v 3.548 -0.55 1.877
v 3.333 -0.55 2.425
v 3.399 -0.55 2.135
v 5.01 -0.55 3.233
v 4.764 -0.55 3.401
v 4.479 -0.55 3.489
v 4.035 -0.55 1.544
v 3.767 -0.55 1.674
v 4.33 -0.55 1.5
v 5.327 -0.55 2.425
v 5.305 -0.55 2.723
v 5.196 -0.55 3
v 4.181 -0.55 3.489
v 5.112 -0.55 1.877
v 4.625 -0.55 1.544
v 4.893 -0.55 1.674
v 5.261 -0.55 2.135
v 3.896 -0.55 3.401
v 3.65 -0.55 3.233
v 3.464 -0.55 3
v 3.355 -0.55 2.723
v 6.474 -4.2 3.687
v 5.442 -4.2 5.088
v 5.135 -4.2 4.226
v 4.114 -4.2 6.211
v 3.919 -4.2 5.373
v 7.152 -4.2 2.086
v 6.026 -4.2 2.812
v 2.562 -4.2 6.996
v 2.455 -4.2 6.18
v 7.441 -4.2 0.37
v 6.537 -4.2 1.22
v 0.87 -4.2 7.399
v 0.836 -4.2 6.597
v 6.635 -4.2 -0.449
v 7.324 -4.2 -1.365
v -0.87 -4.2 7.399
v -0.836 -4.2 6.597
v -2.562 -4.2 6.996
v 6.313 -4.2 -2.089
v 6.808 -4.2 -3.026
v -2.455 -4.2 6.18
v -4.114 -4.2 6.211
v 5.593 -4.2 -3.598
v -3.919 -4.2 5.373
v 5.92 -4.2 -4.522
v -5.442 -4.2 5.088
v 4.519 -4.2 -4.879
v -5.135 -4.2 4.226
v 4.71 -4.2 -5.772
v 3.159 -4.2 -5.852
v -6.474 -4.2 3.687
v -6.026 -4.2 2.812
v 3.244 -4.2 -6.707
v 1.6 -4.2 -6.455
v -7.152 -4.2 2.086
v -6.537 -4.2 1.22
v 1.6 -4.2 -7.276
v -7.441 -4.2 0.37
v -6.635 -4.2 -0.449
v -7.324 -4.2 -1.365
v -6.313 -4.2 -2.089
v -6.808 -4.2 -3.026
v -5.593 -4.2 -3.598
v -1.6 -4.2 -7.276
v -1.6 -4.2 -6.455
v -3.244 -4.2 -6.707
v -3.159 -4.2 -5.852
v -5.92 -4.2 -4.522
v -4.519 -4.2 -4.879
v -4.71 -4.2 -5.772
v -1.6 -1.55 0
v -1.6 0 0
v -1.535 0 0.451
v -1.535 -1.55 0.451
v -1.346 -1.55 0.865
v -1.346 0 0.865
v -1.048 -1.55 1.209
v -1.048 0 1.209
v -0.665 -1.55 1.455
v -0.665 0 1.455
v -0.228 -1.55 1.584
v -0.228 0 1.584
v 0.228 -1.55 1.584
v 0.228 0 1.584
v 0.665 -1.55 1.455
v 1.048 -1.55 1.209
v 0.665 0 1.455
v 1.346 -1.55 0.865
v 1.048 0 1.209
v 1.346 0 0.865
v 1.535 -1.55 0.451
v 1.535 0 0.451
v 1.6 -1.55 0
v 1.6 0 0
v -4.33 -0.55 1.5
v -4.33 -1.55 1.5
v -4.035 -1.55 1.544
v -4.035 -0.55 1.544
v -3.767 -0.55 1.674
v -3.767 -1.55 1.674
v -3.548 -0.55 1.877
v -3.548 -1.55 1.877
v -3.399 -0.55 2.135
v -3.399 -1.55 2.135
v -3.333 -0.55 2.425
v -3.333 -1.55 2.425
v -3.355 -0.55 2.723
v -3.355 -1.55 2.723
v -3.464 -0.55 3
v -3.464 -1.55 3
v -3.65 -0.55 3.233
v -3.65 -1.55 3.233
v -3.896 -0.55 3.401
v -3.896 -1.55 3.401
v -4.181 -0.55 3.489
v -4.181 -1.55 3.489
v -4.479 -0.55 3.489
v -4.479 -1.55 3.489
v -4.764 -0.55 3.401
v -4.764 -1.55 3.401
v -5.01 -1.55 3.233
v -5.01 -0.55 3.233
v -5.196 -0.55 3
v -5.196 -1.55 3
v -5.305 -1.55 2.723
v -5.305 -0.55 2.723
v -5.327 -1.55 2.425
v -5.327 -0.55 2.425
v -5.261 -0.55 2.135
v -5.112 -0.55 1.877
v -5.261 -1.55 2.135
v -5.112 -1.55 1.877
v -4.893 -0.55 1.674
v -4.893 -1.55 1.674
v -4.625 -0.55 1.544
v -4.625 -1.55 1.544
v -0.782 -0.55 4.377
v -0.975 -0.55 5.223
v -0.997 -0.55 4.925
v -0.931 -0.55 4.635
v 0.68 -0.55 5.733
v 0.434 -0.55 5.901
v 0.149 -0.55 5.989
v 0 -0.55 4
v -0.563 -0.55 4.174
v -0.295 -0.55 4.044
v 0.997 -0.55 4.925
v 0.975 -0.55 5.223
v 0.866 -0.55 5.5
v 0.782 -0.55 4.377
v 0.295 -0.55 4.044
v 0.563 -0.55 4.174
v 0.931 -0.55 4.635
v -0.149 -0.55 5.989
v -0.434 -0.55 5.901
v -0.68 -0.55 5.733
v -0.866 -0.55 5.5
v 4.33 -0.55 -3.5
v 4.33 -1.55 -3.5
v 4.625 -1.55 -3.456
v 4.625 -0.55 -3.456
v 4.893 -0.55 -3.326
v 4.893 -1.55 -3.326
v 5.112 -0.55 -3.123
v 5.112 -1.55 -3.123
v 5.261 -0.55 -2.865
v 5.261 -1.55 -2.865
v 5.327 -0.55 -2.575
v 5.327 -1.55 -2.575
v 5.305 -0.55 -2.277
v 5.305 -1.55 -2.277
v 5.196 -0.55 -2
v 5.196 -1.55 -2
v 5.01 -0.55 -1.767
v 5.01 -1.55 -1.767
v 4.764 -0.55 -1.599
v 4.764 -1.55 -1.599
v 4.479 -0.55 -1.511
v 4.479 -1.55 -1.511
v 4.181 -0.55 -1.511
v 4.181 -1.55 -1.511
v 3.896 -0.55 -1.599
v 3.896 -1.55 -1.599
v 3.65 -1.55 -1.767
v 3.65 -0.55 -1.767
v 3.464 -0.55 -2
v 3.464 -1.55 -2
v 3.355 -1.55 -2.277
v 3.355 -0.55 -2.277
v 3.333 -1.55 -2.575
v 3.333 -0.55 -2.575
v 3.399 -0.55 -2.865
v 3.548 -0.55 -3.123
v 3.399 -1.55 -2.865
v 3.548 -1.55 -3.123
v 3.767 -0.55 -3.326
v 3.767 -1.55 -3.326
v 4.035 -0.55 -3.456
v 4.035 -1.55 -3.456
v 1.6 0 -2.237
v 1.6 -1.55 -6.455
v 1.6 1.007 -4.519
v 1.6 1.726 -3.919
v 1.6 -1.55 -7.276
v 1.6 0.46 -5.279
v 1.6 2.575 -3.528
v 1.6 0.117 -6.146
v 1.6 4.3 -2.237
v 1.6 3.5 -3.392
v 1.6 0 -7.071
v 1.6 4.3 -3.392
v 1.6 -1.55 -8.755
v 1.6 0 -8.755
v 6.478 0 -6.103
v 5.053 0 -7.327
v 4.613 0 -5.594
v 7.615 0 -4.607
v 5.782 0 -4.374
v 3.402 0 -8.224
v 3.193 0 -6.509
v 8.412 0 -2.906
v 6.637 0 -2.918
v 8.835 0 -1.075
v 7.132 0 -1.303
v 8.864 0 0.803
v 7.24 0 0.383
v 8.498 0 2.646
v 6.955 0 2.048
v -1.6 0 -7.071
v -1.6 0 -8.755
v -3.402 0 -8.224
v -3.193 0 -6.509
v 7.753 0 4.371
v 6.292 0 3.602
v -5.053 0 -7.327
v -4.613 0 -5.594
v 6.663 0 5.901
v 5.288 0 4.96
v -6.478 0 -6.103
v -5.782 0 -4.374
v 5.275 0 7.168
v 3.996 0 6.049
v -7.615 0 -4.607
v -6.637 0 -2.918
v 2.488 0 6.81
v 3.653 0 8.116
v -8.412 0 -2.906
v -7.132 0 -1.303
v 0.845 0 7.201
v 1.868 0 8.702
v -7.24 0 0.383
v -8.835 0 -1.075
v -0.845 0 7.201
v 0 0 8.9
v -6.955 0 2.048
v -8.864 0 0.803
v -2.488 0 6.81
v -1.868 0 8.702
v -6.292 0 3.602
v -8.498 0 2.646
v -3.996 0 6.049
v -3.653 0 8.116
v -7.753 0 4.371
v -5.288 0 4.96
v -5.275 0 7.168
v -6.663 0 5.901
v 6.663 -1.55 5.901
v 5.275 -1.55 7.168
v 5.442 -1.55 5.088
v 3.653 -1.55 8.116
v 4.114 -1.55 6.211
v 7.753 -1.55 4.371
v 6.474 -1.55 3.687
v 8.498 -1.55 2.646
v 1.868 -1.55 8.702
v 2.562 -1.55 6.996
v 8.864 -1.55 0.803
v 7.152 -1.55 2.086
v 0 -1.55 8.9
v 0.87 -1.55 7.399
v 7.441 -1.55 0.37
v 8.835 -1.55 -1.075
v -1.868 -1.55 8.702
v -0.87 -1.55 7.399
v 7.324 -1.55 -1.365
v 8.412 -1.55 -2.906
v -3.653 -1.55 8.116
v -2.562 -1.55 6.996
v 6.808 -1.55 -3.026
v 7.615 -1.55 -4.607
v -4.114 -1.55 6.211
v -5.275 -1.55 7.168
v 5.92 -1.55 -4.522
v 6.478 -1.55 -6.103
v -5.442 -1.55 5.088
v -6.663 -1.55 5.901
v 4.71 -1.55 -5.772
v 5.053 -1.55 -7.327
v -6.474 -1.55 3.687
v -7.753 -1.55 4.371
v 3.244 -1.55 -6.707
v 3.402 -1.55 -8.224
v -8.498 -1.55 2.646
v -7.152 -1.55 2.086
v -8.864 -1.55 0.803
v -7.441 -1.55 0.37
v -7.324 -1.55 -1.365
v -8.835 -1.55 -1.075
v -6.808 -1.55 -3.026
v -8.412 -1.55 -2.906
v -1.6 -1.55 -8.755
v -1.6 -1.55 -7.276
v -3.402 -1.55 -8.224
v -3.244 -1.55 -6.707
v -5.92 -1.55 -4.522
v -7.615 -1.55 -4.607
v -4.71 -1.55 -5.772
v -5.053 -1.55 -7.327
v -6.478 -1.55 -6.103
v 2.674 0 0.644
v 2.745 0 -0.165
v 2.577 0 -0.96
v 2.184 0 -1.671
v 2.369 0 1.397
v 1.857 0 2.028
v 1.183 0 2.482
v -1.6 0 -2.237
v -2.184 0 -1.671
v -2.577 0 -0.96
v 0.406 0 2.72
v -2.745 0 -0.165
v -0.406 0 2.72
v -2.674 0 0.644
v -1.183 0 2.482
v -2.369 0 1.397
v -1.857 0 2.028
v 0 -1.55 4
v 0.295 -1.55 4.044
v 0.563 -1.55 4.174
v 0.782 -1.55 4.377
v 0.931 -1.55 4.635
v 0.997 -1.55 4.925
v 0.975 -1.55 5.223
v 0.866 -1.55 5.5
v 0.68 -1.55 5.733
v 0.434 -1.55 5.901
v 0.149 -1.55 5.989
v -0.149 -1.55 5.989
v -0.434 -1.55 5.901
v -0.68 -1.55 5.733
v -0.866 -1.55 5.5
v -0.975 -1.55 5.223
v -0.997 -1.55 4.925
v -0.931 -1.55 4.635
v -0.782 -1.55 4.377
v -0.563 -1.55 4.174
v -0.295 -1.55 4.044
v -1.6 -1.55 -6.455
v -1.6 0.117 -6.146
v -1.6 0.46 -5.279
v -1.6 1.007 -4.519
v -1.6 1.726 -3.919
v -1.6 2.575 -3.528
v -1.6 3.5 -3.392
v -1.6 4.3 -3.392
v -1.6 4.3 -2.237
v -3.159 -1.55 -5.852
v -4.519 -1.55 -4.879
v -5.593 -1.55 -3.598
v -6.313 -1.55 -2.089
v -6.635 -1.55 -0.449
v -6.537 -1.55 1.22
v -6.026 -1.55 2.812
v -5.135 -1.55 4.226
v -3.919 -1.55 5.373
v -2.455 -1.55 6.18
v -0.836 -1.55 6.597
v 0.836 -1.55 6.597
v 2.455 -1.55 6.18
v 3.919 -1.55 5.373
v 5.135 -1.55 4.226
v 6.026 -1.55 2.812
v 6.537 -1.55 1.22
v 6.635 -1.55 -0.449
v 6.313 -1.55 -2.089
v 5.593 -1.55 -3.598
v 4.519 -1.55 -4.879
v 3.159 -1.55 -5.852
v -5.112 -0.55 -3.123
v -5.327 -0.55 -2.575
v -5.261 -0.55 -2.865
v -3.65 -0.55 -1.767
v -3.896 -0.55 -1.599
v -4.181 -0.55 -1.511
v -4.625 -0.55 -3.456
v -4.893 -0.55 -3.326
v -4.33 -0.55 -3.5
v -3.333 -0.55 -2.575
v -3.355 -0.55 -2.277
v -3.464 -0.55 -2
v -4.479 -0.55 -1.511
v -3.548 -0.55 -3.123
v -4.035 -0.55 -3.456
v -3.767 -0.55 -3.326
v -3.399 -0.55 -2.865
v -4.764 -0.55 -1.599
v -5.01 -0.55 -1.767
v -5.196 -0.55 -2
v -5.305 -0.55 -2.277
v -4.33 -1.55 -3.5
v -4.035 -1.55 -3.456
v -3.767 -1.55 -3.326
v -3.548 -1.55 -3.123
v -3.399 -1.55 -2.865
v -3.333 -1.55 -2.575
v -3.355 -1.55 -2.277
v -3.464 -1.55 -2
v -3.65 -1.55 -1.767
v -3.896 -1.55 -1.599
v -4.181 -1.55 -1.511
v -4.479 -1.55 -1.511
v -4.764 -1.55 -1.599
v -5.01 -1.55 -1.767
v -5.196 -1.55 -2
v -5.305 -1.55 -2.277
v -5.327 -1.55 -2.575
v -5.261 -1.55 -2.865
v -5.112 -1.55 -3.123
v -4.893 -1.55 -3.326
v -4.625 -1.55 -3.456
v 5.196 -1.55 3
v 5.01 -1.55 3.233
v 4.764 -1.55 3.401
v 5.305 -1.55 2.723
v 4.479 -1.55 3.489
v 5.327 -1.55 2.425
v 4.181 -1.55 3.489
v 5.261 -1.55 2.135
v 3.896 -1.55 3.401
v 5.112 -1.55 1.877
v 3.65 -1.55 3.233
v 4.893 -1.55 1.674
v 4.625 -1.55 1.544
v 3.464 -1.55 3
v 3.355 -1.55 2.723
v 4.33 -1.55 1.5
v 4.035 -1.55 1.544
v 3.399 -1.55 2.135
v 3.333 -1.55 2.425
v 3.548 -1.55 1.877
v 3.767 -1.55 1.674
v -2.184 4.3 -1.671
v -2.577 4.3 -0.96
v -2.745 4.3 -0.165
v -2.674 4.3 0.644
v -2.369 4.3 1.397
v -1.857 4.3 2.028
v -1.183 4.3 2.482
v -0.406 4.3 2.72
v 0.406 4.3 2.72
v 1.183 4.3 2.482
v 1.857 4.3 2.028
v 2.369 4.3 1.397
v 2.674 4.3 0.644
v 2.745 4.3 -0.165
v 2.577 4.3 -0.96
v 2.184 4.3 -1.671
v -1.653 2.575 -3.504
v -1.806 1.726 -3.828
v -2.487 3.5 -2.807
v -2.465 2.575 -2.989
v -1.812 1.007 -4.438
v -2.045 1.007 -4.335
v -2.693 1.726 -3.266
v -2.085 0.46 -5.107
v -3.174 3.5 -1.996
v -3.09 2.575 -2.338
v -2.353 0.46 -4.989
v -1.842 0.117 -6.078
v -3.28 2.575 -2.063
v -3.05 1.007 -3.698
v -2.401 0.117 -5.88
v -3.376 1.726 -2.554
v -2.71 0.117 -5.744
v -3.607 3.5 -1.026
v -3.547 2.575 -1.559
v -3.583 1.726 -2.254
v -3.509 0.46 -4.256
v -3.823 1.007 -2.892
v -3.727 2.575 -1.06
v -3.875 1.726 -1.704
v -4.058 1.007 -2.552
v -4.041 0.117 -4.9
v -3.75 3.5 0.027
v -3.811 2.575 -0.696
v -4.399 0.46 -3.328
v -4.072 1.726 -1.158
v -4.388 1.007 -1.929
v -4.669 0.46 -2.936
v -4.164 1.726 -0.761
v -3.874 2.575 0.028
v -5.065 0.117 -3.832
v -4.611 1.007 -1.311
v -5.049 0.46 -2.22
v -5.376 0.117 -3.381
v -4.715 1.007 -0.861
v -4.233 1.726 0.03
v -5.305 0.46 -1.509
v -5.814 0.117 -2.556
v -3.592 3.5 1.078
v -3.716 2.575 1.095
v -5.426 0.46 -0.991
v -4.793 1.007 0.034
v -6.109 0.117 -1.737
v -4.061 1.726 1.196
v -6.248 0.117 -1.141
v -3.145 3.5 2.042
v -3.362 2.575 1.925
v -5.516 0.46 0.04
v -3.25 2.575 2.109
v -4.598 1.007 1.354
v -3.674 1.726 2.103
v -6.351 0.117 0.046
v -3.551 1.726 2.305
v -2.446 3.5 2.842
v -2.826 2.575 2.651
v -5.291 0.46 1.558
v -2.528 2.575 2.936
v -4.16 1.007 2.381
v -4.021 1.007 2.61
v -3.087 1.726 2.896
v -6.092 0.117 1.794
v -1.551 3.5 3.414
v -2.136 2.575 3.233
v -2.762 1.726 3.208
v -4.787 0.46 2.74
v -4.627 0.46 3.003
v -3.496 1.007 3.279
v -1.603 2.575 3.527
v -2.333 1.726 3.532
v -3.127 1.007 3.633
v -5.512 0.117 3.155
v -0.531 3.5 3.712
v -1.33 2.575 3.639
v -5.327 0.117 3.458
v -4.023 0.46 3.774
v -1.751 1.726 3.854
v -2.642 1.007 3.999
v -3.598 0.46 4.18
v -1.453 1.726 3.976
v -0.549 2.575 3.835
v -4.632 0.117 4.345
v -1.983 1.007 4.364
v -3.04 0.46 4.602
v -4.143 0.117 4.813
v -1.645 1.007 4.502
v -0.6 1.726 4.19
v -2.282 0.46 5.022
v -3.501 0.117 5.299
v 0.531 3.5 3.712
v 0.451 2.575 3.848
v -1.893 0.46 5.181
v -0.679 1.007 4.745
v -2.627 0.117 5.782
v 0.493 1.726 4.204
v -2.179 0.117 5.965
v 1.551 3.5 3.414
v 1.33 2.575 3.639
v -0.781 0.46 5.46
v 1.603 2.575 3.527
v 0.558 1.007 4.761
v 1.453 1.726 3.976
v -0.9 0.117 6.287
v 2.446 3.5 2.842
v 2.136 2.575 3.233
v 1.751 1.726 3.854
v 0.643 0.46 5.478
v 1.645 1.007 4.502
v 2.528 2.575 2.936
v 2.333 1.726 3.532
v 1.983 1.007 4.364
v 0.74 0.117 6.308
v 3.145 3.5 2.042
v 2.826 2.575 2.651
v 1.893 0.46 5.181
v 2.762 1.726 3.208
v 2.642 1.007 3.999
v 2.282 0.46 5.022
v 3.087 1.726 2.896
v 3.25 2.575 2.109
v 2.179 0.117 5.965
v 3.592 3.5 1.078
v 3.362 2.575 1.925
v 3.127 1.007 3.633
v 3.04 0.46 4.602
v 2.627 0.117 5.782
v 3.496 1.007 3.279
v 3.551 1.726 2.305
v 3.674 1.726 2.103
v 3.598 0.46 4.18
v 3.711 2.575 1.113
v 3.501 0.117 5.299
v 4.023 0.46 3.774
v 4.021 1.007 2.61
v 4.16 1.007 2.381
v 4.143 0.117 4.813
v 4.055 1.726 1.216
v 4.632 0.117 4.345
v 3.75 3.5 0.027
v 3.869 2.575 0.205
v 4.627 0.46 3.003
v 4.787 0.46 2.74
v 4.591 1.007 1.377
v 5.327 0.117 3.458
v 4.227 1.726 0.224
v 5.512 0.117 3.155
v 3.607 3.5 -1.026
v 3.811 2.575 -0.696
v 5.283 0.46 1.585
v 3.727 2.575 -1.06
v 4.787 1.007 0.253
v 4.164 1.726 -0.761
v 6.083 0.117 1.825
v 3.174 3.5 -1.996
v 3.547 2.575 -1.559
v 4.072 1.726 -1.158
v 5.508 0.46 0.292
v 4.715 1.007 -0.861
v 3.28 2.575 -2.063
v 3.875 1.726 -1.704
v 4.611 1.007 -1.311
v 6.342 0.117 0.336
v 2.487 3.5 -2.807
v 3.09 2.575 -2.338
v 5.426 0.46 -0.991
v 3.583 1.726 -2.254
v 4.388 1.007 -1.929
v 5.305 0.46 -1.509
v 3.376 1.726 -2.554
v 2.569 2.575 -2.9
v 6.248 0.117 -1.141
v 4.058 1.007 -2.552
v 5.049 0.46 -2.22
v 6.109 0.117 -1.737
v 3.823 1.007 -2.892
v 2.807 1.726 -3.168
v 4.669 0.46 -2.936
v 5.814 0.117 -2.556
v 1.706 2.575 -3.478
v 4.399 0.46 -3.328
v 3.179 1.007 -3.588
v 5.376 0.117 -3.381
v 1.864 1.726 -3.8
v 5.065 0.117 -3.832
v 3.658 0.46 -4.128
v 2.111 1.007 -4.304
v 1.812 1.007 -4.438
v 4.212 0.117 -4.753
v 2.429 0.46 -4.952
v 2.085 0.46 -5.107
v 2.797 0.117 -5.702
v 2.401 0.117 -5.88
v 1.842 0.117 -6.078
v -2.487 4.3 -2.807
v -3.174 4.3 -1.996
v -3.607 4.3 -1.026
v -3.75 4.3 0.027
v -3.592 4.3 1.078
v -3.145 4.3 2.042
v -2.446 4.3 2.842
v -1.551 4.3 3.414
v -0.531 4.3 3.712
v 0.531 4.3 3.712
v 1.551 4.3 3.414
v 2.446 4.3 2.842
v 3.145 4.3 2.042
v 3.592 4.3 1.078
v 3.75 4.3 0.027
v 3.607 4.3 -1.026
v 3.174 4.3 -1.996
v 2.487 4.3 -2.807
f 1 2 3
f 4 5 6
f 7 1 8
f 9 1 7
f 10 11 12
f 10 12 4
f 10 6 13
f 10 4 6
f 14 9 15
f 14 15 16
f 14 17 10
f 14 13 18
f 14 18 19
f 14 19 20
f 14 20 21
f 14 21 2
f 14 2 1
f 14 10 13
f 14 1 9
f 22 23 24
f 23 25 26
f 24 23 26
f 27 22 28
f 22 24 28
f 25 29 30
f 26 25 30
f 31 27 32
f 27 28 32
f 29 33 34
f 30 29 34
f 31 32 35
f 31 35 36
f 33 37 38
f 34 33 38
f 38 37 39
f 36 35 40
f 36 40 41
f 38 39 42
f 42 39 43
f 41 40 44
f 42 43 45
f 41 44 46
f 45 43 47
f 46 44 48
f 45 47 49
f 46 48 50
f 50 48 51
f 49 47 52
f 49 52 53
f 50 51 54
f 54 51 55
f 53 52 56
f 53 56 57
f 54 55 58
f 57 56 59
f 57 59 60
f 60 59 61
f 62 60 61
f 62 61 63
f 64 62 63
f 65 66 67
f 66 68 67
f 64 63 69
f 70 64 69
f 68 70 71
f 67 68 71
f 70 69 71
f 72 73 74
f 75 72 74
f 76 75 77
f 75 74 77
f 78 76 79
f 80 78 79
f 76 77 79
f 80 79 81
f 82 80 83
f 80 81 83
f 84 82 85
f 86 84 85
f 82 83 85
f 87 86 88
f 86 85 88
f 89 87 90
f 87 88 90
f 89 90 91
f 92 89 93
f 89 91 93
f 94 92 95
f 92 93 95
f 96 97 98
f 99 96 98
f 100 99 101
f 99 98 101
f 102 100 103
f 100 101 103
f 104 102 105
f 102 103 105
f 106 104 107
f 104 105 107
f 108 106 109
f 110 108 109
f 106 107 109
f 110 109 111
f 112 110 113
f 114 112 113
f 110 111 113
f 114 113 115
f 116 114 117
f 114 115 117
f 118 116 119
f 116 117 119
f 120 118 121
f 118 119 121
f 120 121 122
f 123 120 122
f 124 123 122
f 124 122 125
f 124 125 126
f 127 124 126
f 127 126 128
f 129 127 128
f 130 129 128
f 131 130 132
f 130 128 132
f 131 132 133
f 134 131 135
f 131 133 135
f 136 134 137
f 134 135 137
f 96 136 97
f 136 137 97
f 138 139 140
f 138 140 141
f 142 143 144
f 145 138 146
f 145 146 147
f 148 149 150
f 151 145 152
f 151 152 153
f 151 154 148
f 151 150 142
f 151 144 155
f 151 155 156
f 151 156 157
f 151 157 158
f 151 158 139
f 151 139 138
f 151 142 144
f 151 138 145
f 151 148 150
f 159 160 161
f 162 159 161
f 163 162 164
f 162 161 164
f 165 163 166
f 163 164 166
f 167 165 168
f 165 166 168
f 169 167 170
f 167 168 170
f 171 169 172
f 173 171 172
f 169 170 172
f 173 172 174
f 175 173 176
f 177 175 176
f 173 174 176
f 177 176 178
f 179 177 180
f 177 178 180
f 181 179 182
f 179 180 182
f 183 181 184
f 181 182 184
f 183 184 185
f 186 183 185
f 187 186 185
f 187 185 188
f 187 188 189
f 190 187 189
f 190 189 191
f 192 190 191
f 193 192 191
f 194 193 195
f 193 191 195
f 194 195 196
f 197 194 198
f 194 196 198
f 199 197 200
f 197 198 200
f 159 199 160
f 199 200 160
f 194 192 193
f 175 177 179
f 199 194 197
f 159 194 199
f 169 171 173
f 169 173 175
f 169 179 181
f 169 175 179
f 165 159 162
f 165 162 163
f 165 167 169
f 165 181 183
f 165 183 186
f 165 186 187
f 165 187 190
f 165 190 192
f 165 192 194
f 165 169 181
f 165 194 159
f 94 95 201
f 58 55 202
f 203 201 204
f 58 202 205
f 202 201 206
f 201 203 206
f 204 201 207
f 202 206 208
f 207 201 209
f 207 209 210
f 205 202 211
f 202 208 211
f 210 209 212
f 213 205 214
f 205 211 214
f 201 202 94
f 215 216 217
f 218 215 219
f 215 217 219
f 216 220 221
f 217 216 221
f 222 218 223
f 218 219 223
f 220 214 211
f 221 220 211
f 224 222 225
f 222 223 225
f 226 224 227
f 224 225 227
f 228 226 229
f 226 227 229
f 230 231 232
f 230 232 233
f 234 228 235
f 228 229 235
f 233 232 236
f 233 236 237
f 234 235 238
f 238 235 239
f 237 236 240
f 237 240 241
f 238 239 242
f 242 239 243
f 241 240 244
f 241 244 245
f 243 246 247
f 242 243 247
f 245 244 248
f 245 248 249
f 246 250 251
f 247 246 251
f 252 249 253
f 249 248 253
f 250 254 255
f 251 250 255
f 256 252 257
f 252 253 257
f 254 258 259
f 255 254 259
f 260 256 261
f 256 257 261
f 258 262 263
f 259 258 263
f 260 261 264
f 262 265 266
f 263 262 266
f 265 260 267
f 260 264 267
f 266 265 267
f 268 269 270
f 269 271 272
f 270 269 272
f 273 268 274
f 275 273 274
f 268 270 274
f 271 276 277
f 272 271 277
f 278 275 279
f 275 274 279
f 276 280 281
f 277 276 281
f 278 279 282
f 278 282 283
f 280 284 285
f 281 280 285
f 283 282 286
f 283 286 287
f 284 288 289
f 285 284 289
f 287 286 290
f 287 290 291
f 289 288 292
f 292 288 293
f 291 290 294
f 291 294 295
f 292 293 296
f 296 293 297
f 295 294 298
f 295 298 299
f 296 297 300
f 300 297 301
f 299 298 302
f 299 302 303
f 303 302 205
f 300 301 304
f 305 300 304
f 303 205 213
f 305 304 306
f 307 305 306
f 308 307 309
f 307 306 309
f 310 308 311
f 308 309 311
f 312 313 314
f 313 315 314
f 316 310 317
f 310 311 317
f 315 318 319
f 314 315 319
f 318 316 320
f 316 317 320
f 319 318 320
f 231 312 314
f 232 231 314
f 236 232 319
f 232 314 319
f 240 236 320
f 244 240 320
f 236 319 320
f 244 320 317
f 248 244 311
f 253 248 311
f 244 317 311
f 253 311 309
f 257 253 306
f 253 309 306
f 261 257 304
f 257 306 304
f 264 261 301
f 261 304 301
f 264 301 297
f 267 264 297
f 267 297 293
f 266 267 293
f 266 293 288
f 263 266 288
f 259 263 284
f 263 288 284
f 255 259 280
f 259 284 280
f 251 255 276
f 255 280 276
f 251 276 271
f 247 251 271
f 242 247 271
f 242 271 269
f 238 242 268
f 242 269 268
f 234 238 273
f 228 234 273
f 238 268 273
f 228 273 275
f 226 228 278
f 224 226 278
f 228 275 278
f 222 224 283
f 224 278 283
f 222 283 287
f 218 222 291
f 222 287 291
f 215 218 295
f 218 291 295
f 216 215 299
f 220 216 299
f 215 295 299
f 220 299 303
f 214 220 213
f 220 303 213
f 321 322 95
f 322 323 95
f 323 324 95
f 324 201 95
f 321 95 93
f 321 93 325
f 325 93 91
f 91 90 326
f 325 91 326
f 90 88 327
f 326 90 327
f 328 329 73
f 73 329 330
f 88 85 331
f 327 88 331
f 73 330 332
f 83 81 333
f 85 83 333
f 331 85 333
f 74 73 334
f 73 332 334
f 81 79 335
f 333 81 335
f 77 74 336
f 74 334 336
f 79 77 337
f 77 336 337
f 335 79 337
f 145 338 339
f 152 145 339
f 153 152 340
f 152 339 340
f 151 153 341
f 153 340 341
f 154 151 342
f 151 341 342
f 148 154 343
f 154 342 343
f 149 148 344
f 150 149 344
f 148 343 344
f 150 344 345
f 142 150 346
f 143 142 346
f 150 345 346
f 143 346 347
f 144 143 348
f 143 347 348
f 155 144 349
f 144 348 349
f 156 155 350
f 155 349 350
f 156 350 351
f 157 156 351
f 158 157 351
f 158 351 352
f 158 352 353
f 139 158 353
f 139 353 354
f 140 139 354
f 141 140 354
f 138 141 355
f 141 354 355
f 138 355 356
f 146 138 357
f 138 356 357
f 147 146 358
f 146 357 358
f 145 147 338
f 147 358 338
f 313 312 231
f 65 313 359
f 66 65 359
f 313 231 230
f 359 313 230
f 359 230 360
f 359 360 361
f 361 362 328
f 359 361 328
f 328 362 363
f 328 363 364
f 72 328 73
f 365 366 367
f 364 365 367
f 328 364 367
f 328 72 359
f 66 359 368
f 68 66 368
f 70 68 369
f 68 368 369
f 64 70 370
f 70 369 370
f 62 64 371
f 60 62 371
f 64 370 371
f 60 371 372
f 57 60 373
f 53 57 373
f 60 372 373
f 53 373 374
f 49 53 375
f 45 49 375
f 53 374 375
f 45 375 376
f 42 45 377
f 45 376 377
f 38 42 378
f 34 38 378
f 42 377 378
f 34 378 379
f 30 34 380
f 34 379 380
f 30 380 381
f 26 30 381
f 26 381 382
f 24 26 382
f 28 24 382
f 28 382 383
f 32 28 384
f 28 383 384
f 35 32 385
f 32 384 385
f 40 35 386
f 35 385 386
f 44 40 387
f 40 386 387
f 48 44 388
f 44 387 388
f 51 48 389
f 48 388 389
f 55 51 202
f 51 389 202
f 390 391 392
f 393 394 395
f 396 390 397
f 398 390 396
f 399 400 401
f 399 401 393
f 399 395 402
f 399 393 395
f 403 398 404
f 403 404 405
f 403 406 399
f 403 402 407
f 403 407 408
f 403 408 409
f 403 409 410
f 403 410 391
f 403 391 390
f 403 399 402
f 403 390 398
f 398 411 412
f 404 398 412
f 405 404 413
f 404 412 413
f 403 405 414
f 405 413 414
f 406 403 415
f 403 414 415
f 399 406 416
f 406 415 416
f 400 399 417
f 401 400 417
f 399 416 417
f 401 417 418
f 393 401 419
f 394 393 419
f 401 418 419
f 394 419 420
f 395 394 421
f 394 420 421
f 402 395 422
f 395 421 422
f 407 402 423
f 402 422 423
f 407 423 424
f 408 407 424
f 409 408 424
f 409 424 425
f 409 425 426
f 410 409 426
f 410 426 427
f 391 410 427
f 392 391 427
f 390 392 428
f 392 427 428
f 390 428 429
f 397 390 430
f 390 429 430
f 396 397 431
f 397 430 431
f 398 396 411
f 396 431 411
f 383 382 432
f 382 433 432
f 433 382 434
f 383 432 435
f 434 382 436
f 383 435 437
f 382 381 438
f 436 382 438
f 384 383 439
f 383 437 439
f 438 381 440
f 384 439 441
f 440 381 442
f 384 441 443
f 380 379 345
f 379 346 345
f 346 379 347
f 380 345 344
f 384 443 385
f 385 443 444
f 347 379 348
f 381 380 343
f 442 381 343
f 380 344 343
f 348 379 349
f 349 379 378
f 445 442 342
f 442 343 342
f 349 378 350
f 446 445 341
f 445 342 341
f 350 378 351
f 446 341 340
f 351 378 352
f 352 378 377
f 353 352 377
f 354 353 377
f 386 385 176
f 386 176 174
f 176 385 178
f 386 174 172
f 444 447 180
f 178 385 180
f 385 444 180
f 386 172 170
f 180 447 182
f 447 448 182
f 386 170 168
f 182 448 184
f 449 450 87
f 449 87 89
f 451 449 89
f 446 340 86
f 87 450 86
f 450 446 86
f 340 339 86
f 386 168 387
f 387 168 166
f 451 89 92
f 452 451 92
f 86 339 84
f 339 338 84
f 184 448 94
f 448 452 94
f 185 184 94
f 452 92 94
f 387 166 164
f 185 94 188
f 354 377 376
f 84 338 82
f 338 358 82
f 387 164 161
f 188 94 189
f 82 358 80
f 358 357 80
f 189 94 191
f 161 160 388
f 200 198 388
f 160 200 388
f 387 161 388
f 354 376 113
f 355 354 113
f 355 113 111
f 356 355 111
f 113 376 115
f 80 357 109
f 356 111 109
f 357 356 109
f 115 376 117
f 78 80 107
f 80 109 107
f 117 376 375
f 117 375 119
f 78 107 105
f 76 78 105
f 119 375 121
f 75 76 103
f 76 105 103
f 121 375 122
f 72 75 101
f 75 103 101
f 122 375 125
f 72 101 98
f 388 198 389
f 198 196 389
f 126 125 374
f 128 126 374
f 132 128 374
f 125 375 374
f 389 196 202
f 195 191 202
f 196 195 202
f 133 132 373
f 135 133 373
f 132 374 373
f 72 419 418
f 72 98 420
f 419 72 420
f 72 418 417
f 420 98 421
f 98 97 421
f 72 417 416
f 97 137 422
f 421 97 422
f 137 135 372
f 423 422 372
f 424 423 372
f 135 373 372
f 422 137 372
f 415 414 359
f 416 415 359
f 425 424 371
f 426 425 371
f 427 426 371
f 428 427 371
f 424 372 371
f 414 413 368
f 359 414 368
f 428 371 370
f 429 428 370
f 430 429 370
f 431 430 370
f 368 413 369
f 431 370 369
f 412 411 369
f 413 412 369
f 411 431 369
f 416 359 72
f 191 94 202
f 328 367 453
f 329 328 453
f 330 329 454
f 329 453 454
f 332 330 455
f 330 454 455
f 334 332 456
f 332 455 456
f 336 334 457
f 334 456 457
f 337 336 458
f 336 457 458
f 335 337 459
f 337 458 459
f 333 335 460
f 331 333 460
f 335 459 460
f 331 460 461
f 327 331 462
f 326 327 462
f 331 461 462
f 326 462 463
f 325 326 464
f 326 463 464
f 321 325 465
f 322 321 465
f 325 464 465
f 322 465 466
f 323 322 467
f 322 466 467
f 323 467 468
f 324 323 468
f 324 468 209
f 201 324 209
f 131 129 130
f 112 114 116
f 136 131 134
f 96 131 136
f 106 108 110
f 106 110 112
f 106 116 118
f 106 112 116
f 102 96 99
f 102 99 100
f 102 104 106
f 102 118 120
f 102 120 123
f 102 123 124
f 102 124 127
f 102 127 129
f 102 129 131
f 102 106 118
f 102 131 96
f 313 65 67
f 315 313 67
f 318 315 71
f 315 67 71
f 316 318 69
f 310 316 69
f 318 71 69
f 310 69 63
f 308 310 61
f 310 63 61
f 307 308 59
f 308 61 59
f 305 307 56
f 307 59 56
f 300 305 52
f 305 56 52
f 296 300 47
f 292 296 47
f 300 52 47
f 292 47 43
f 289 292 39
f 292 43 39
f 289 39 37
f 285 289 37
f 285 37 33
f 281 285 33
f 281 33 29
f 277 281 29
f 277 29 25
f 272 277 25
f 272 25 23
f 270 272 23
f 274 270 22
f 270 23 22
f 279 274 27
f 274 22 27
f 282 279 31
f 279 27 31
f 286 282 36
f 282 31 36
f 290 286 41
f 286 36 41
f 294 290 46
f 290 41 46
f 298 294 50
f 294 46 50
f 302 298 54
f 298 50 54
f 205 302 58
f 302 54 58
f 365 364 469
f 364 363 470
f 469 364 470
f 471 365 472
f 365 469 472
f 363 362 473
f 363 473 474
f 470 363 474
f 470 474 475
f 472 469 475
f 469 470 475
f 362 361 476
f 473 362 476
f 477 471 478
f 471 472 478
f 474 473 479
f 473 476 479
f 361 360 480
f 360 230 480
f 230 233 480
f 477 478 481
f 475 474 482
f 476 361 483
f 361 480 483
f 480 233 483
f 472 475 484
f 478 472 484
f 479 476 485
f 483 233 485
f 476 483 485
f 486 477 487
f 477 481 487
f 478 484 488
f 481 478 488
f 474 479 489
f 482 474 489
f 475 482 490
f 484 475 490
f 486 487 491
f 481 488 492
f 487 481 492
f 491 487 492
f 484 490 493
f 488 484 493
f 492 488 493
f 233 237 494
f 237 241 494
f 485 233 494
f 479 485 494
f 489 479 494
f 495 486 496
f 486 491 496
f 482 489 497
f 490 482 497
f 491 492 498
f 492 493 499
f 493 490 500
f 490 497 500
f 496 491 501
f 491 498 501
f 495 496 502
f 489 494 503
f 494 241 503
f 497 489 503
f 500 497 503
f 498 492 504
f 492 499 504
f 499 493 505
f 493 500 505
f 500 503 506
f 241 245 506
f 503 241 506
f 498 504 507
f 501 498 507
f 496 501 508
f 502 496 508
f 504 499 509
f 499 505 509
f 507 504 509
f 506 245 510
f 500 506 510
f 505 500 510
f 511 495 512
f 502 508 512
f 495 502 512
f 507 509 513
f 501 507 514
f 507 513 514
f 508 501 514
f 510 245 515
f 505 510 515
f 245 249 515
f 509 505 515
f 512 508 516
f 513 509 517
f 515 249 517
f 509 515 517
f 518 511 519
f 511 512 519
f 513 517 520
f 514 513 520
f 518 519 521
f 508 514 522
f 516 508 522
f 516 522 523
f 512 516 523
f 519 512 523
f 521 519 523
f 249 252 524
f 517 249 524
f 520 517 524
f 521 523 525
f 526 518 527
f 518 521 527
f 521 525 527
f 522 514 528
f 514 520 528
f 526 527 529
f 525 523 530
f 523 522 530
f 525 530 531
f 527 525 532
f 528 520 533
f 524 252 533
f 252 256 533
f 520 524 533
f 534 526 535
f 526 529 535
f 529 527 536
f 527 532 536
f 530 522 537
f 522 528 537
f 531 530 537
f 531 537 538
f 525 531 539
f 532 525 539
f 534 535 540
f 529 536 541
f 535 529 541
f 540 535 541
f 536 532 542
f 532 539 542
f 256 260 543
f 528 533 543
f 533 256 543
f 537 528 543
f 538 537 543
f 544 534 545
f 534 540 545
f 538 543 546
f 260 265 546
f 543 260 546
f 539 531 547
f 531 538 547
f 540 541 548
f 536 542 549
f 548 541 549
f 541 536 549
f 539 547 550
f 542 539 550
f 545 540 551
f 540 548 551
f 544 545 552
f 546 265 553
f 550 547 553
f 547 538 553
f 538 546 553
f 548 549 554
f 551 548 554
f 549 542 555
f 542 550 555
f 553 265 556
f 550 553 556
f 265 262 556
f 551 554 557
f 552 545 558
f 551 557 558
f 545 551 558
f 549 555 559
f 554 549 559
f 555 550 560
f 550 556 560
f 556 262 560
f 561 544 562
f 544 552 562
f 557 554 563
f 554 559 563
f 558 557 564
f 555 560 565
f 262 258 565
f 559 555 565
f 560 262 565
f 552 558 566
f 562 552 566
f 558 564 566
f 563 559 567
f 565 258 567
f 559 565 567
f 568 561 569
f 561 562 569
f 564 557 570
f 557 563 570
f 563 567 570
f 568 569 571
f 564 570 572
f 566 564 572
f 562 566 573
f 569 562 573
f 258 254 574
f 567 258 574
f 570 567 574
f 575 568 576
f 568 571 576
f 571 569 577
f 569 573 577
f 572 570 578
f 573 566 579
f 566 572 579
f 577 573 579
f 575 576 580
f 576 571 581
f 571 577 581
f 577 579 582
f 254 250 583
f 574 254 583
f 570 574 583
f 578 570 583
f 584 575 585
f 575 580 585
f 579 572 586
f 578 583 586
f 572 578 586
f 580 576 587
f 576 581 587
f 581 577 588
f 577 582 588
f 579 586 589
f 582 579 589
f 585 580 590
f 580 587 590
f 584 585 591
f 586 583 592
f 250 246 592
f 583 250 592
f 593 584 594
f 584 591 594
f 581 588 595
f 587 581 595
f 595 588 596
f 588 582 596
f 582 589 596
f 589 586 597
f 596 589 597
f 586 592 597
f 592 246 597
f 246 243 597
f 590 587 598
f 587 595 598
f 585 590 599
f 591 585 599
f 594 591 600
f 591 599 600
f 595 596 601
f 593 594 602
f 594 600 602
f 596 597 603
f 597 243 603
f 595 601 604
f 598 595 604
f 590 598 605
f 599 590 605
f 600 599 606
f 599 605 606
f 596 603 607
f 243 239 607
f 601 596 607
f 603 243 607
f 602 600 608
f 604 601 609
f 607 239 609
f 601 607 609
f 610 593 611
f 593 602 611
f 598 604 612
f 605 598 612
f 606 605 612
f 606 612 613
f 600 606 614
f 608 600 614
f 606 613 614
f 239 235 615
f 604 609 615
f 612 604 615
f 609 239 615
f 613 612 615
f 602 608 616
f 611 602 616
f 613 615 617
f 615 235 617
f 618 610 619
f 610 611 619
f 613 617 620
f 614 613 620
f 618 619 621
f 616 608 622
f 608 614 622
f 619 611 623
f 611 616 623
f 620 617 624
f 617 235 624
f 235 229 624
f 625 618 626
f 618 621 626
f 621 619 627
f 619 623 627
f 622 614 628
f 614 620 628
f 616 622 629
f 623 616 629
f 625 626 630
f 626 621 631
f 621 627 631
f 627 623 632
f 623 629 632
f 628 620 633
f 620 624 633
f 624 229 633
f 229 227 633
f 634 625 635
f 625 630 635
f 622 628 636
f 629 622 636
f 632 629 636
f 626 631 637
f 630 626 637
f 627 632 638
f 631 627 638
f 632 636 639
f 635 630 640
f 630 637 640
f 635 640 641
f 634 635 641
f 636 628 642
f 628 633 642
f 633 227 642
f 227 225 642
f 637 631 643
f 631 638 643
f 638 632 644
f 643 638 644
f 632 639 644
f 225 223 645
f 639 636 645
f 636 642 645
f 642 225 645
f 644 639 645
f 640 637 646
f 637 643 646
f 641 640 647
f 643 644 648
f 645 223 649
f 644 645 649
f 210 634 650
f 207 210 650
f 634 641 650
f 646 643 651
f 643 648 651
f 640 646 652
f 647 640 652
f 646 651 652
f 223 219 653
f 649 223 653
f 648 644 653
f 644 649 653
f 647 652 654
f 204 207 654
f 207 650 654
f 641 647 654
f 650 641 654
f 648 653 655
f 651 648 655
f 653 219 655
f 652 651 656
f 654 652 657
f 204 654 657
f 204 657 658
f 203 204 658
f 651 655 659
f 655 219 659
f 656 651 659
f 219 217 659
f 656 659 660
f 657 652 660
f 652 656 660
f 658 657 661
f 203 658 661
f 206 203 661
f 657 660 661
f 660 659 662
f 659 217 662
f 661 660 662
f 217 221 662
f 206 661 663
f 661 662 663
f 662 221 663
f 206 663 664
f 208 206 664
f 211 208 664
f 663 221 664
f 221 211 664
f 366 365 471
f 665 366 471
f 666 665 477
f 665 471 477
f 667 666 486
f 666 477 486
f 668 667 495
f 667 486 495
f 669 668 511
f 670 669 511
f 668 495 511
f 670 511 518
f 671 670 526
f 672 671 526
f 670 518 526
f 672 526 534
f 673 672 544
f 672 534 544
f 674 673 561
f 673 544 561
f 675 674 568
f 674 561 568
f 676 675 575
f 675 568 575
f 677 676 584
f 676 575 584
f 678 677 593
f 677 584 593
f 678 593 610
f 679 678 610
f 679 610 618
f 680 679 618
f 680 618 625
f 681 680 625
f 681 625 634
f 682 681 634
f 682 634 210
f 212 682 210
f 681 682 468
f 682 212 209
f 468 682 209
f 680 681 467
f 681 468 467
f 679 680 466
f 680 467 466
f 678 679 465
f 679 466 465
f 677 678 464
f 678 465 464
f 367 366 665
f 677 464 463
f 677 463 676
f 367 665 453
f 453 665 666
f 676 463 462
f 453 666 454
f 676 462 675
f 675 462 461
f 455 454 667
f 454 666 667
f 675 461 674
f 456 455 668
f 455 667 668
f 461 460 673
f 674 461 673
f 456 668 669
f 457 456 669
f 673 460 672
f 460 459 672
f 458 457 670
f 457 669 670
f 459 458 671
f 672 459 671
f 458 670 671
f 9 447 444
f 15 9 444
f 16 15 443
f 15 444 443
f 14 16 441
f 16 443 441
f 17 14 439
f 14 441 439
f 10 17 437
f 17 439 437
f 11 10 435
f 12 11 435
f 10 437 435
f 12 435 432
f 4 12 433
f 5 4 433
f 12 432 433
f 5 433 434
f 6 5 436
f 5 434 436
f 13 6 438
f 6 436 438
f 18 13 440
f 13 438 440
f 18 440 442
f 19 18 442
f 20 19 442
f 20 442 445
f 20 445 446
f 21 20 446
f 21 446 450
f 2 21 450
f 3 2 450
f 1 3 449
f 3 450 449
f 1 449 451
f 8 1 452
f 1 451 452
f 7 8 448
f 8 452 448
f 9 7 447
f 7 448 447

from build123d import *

# Parameters (mm, degrees)
CUT_EXTRUDE1_DEPTH      = 14.879571319
CUT_EXTRUDE1_DEPTH_BACK = 14.879571319
SKETCH3_R               = 1
CUT_EXTRUDE2_DEPTH      = 1


with BuildPart() as part:
    # Sketch1 → Revolve1 (revolve)
    with BuildSketch(Plane(origin=(0, 0, 0), x_dir=(0, 0, -1), z_dir=(1, 0, 0))):
        with BuildLine():
            Line((0, 0), (2.75, 0))
            Line((2.75, 0), (2.75, 4.3))
            Line((2.75, 4.3), (3.75, 4.3))
            Line((3.75, 4.3), (3.75, 3.5))
            ThreePointArc((3.75, 3.5), (4.775126266, 1.025126266), (7.25, 0))
            Line((7.25, 0), (8.9, 0))
            Line((8.9, 0), (8.9, -1.55))
            Line((8.9, -1.55), (7.45, -1.55))
            Line((7.45, -1.55), (7.45, -4.2))
            Line((7.45, -4.2), (6.65, -4.2))
            Line((6.65, -4.2), (6.65, -1.55))
            Line((6.65, -1.55), (0, -1.55))
            Line((0, -1.55), (0, 0))
        make_face()
    revolve(axis=Axis((0, -1.55, 0), (0, 1, 0)))

    # Sketch2 → Cut-Extrude1 (cut, two sides: drawn at the far end of the back side and taken through both)
    with BuildSketch(Plane.XZ.offset(1.55).offset(-CUT_EXTRUDE1_DEPTH_BACK)):
        with BuildLine():
            Line((1.6, 0), (1.6, -8.9))
            ThreePointArc((1.6, -8.9), (0, -10.5), (-1.6, -8.9))
            Line((-1.6, -8.9), (-1.6, 0))
            ThreePointArc((-1.6, 0), (0, 1.6), (1.6, 0))
        make_face()
    extrude(amount=CUT_EXTRUDE1_DEPTH + CUT_EXTRUDE1_DEPTH_BACK, mode=Mode.SUBTRACT)

    # Sketch3 → Cut-Extrude2 (cut)
    with BuildSketch(Plane.XZ.offset(1.55)):
        with Locations(Location((-4.330127019, -2.5, 0), (0, 0, 270))):
            Circle(SKETCH3_R)
        with Locations(Location((-4.330127019, 2.5, 0), (0, 0, 270))):
            Circle(SKETCH3_R)
        with Locations(Location((0, 5, 0), (0, 0, 270))):
            Circle(SKETCH3_R)
        with Locations(Location((4.330127019, 2.5, 0), (0, 0, 270))):
            Circle(SKETCH3_R)
        with Locations(Location((4.330127019, -2.5, 0), (0, 0, 270))):
            Circle(SKETCH3_R)
        with Locations((0, -5)):
            Circle(SKETCH3_R)
    extrude(amount=-CUT_EXTRUDE2_DEPTH, mode=Mode.SUBTRACT)


solid = part.part
